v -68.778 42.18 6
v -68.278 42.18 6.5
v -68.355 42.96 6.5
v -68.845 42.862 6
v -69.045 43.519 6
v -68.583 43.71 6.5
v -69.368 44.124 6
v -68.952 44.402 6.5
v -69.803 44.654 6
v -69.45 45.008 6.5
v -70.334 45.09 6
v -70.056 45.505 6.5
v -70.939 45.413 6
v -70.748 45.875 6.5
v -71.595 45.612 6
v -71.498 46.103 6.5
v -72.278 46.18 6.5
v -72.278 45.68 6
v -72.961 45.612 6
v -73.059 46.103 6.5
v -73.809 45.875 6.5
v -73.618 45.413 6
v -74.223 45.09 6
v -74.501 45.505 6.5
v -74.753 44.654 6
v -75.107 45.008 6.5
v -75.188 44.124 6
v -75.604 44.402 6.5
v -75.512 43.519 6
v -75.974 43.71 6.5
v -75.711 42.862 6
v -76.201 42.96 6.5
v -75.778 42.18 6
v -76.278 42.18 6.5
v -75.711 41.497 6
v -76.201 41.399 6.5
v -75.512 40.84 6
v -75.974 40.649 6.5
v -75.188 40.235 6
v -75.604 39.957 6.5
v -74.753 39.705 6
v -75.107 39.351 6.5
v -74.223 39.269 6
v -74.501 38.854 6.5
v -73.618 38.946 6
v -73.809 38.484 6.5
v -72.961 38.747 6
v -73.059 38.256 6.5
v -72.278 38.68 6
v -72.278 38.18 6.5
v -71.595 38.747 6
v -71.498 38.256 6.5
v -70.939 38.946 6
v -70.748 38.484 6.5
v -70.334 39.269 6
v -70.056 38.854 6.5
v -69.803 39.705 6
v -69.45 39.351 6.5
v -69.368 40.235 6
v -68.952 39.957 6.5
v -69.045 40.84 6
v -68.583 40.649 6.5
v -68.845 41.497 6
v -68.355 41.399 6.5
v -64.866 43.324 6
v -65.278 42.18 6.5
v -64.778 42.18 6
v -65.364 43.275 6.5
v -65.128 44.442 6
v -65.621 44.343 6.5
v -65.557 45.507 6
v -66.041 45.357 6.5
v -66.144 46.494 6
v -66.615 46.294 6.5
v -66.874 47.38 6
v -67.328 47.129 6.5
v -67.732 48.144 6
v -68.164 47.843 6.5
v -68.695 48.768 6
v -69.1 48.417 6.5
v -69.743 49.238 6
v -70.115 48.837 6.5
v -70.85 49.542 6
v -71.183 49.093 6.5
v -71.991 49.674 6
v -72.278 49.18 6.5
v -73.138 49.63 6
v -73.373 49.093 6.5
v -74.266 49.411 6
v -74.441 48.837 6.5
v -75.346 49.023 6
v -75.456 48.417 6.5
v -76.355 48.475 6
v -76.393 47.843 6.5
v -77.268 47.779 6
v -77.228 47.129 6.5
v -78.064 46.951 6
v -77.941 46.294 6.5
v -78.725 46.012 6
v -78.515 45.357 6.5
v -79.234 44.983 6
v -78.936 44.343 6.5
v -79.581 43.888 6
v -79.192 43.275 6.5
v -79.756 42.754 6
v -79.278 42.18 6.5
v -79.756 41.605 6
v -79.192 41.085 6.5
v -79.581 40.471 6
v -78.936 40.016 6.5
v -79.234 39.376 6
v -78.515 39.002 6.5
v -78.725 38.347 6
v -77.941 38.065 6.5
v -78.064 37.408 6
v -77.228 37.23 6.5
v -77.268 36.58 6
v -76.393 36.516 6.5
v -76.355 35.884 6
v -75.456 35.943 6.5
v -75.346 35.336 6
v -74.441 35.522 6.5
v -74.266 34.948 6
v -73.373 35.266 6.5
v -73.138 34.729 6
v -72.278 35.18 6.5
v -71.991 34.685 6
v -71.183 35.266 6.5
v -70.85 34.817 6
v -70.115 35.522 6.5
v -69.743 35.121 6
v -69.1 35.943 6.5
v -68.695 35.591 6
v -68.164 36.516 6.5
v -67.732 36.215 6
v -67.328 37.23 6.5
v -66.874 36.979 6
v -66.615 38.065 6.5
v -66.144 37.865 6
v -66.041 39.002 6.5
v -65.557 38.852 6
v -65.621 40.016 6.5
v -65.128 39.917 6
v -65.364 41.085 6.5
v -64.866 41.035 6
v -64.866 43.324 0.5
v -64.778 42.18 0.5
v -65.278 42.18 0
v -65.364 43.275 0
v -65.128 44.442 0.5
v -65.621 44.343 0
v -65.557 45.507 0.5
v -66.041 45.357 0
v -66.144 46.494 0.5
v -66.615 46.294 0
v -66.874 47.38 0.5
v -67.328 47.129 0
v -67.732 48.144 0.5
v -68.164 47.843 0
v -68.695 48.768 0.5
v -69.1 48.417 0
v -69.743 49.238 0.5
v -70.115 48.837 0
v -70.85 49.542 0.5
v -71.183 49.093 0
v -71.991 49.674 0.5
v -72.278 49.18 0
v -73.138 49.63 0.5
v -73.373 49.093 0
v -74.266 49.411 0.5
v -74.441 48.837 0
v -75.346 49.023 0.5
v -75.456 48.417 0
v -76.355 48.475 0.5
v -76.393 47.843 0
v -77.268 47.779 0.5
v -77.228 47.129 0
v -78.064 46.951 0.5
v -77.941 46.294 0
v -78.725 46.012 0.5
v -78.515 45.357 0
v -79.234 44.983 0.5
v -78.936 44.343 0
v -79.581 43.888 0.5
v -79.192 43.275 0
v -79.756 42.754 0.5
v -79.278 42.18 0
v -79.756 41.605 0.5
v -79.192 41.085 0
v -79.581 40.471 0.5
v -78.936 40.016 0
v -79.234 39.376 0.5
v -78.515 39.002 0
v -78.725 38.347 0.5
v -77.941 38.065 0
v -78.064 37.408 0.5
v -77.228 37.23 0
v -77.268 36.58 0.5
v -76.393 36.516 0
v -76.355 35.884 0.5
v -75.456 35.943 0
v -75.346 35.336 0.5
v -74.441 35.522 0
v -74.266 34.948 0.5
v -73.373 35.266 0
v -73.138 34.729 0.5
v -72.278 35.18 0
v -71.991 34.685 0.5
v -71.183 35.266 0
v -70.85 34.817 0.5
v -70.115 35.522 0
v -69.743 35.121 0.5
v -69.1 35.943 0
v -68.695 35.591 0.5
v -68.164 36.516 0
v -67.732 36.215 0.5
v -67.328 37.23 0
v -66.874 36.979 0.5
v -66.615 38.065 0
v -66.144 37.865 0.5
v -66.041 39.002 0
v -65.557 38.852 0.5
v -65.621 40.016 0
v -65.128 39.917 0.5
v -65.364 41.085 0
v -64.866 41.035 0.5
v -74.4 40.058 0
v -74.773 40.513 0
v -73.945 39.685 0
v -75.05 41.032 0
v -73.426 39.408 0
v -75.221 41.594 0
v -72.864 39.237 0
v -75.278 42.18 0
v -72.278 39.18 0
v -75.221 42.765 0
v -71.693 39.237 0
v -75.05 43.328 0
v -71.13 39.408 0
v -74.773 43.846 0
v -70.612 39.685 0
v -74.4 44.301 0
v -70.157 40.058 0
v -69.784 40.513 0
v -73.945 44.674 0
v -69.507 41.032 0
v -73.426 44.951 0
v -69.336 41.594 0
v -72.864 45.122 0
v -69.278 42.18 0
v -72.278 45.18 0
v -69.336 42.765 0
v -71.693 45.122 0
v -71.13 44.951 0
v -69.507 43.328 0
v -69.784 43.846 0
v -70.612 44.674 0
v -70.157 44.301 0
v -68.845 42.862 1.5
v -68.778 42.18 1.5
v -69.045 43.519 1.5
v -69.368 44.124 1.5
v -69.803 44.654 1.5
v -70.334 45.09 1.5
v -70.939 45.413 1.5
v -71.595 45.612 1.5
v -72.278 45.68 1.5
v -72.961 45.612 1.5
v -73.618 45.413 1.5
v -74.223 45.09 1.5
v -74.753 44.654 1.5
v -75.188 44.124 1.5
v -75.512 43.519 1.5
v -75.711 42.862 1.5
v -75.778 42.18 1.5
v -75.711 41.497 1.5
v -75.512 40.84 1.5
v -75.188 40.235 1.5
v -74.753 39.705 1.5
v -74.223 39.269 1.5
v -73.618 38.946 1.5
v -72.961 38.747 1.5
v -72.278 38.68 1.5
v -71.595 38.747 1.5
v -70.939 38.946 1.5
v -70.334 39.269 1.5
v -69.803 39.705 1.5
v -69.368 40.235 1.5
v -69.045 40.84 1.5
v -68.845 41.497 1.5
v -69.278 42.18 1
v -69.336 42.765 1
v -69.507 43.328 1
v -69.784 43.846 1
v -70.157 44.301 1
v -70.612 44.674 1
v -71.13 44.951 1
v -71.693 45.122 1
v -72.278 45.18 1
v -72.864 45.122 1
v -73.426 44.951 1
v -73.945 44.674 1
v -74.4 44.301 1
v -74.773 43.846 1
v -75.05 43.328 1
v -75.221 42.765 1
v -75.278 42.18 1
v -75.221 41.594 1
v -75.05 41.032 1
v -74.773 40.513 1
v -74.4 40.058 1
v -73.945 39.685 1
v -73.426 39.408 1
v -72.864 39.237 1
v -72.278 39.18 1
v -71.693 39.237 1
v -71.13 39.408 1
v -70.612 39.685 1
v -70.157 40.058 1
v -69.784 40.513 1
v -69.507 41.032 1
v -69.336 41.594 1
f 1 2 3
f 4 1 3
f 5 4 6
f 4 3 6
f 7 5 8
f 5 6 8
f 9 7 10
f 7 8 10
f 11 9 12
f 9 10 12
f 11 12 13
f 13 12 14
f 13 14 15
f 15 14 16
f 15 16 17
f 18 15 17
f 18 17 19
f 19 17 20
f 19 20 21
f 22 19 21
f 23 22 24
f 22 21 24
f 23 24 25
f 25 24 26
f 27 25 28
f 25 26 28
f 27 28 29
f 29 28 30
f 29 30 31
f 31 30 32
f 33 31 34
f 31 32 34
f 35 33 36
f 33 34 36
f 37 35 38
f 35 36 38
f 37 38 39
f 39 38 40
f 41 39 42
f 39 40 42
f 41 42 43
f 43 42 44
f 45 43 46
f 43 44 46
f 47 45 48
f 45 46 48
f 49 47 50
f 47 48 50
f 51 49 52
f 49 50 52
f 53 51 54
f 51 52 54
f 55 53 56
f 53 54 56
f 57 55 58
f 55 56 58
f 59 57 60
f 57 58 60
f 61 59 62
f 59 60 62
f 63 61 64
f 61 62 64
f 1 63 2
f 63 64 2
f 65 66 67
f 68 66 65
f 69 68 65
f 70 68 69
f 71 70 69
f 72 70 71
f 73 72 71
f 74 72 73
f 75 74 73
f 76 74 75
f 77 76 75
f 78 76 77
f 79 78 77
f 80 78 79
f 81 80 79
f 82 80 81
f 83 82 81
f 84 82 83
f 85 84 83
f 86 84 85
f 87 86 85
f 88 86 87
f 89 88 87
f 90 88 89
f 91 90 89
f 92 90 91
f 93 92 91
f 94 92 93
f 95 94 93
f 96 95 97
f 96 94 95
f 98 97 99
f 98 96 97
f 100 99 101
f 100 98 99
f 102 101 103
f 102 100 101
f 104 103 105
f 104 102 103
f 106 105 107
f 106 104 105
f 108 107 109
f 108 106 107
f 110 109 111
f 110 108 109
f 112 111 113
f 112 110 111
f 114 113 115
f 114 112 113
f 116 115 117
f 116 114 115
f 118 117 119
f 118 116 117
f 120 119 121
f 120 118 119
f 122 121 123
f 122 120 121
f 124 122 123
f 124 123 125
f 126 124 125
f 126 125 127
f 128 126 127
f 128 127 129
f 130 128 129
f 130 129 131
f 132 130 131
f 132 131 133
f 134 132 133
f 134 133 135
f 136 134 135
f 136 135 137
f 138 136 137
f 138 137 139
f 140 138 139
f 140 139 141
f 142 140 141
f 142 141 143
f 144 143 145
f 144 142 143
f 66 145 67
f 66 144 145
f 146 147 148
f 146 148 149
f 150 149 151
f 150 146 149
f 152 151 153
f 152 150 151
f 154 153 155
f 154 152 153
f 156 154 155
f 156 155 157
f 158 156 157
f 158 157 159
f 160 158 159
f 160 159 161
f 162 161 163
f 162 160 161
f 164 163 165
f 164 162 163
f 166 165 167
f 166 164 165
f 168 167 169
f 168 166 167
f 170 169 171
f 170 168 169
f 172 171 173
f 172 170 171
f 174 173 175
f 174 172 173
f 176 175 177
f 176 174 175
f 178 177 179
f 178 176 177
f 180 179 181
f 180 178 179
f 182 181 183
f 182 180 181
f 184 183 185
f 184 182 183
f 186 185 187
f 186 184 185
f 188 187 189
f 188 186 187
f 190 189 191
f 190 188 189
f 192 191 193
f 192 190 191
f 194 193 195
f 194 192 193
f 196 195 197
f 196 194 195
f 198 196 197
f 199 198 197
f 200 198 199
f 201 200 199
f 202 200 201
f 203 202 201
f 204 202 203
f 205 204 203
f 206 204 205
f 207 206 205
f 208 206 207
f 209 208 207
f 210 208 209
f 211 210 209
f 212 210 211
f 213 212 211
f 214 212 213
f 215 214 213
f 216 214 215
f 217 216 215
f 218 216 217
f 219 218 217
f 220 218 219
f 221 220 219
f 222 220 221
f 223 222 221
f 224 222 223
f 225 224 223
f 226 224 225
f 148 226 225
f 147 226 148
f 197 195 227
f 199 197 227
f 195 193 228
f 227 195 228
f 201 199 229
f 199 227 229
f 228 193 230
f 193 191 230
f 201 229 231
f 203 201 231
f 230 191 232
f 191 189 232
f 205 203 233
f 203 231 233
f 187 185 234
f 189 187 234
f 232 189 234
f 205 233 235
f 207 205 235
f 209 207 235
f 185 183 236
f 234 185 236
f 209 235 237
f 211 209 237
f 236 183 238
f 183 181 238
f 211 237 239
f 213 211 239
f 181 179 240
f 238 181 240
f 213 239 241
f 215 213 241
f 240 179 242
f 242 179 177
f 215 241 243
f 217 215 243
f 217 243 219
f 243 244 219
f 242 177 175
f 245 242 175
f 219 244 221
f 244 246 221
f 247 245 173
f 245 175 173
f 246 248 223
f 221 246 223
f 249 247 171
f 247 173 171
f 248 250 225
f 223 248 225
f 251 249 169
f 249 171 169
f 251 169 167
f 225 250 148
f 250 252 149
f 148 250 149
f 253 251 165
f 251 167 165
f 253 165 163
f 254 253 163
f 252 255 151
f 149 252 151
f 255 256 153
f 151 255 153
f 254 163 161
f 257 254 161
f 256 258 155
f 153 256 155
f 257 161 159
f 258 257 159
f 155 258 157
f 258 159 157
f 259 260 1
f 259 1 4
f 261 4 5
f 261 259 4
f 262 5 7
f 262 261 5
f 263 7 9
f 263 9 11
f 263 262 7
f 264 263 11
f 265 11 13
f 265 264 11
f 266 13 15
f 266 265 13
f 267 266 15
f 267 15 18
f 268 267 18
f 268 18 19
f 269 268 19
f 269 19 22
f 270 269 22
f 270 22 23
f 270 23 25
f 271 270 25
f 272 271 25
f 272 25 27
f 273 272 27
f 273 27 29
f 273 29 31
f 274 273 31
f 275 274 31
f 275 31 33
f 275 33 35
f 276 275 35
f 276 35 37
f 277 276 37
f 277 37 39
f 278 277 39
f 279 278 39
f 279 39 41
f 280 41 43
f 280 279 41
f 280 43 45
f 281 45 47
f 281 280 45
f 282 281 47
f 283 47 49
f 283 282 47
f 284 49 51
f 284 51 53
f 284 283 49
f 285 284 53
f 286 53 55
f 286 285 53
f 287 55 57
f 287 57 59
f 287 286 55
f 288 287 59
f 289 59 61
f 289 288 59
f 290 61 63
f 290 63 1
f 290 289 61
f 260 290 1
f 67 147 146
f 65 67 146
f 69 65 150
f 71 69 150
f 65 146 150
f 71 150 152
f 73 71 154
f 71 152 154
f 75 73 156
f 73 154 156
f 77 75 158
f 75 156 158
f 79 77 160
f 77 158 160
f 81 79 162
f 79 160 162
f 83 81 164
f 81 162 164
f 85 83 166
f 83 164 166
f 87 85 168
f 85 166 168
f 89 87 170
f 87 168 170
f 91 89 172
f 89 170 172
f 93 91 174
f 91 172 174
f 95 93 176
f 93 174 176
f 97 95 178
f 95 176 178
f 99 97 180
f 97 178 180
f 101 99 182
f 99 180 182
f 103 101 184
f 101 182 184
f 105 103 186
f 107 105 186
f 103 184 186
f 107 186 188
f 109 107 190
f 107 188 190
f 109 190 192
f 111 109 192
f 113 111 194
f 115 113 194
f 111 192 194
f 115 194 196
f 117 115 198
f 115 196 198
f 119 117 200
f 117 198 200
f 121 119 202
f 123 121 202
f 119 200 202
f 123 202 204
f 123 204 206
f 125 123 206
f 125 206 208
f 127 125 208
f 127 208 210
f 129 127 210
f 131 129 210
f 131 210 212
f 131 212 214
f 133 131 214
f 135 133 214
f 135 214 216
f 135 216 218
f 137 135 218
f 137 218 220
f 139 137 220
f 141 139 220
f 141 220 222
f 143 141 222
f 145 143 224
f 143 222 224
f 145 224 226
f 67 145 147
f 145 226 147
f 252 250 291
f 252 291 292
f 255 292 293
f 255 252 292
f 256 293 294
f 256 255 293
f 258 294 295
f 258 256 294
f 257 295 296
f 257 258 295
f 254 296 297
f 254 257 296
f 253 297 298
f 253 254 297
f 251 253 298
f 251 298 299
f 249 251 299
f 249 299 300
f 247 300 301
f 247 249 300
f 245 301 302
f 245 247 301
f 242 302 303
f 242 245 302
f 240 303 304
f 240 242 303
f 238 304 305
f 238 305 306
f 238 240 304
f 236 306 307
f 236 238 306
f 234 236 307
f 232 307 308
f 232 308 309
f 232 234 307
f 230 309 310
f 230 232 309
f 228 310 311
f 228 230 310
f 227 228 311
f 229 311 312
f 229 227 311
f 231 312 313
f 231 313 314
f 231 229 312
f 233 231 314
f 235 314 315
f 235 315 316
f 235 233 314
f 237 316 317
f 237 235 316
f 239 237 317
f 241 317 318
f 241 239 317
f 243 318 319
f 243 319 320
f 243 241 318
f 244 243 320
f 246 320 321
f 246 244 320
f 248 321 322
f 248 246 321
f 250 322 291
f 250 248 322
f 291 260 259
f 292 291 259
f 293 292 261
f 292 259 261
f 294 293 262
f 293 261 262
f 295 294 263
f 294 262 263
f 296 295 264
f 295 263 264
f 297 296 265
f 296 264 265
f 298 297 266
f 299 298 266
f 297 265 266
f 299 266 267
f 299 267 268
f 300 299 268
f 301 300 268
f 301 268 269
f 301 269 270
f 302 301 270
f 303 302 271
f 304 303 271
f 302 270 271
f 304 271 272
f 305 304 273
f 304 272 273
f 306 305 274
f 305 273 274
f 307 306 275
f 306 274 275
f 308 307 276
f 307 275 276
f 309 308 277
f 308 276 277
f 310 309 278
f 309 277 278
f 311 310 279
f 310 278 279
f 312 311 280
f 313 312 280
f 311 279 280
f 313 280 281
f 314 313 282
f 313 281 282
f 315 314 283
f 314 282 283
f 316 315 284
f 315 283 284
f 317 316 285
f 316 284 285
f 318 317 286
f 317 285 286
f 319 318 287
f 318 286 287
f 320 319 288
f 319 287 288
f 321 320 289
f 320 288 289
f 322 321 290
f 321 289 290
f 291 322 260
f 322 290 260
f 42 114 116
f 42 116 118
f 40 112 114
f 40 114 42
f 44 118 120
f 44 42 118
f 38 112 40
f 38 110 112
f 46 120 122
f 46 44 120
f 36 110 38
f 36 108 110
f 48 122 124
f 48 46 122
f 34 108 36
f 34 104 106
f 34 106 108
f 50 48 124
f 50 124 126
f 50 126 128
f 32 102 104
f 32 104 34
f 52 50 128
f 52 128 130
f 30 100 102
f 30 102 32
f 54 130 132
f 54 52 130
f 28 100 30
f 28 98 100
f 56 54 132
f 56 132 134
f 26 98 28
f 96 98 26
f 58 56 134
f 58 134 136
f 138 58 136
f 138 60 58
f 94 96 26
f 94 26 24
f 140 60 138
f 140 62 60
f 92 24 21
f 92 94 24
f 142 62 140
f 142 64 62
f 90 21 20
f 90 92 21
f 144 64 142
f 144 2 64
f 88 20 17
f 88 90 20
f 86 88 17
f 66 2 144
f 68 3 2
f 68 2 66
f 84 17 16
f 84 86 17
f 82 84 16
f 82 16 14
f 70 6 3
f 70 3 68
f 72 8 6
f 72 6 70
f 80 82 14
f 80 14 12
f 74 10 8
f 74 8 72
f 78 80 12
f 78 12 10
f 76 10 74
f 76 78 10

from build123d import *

# Parameters (mm, degrees)
F0_R     = 7.5
F0_R_2   = 3.5
F1_DEPTH = 6.5
F0_R_3   = 3
F2_DEPTH = 1.5
F3_SIZE  = 0.49999


# Not quite as in the source:
# - a fillet or chamfer is up to 0.001 mm smaller than in the source, because OpenCascade refuses the exact size


with BuildPart() as f1:
    # F0 (on Top) → F1 (new body)
    with BuildSketch(Plane.XY):
        with Locations((-72.2782313824, 42.1795584261)):
            Circle(F0_R)
        with Locations((-72.2782313824, 42.1795584261)):
            Circle(F0_R_2, mode=Mode.SUBTRACT)
    extrude(amount=F1_DEPTH)

    # F0 (on Top) → F2 (join)
    with BuildSketch(Plane.XY):
        with Locations((-72.2782313824, 42.1795584261)):
            Circle(F0_R_2)
        with Locations((-72.2782313824, 42.1795584261)):
            Circle(F0_R_3, mode=Mode.SUBTRACT)
    extrude(amount=F2_DEPTH)

    # F3 (size 0.5 in the source; OpenCascade refuses exactly that, so slightly less here)
    f3_edges = [f1.edges().sort_by_distance(p)[0] for p in [
        (-79.778231, 42.179558, 6.5),
        (-75.778231, 42.179558, 6.5),
        (-75.278231, 42.179558, 1.5),
        (-79.778231, 42.179558, 0),
    ]]
    chamfer(f3_edges, length=F3_SIZE)


solid = f1.part
